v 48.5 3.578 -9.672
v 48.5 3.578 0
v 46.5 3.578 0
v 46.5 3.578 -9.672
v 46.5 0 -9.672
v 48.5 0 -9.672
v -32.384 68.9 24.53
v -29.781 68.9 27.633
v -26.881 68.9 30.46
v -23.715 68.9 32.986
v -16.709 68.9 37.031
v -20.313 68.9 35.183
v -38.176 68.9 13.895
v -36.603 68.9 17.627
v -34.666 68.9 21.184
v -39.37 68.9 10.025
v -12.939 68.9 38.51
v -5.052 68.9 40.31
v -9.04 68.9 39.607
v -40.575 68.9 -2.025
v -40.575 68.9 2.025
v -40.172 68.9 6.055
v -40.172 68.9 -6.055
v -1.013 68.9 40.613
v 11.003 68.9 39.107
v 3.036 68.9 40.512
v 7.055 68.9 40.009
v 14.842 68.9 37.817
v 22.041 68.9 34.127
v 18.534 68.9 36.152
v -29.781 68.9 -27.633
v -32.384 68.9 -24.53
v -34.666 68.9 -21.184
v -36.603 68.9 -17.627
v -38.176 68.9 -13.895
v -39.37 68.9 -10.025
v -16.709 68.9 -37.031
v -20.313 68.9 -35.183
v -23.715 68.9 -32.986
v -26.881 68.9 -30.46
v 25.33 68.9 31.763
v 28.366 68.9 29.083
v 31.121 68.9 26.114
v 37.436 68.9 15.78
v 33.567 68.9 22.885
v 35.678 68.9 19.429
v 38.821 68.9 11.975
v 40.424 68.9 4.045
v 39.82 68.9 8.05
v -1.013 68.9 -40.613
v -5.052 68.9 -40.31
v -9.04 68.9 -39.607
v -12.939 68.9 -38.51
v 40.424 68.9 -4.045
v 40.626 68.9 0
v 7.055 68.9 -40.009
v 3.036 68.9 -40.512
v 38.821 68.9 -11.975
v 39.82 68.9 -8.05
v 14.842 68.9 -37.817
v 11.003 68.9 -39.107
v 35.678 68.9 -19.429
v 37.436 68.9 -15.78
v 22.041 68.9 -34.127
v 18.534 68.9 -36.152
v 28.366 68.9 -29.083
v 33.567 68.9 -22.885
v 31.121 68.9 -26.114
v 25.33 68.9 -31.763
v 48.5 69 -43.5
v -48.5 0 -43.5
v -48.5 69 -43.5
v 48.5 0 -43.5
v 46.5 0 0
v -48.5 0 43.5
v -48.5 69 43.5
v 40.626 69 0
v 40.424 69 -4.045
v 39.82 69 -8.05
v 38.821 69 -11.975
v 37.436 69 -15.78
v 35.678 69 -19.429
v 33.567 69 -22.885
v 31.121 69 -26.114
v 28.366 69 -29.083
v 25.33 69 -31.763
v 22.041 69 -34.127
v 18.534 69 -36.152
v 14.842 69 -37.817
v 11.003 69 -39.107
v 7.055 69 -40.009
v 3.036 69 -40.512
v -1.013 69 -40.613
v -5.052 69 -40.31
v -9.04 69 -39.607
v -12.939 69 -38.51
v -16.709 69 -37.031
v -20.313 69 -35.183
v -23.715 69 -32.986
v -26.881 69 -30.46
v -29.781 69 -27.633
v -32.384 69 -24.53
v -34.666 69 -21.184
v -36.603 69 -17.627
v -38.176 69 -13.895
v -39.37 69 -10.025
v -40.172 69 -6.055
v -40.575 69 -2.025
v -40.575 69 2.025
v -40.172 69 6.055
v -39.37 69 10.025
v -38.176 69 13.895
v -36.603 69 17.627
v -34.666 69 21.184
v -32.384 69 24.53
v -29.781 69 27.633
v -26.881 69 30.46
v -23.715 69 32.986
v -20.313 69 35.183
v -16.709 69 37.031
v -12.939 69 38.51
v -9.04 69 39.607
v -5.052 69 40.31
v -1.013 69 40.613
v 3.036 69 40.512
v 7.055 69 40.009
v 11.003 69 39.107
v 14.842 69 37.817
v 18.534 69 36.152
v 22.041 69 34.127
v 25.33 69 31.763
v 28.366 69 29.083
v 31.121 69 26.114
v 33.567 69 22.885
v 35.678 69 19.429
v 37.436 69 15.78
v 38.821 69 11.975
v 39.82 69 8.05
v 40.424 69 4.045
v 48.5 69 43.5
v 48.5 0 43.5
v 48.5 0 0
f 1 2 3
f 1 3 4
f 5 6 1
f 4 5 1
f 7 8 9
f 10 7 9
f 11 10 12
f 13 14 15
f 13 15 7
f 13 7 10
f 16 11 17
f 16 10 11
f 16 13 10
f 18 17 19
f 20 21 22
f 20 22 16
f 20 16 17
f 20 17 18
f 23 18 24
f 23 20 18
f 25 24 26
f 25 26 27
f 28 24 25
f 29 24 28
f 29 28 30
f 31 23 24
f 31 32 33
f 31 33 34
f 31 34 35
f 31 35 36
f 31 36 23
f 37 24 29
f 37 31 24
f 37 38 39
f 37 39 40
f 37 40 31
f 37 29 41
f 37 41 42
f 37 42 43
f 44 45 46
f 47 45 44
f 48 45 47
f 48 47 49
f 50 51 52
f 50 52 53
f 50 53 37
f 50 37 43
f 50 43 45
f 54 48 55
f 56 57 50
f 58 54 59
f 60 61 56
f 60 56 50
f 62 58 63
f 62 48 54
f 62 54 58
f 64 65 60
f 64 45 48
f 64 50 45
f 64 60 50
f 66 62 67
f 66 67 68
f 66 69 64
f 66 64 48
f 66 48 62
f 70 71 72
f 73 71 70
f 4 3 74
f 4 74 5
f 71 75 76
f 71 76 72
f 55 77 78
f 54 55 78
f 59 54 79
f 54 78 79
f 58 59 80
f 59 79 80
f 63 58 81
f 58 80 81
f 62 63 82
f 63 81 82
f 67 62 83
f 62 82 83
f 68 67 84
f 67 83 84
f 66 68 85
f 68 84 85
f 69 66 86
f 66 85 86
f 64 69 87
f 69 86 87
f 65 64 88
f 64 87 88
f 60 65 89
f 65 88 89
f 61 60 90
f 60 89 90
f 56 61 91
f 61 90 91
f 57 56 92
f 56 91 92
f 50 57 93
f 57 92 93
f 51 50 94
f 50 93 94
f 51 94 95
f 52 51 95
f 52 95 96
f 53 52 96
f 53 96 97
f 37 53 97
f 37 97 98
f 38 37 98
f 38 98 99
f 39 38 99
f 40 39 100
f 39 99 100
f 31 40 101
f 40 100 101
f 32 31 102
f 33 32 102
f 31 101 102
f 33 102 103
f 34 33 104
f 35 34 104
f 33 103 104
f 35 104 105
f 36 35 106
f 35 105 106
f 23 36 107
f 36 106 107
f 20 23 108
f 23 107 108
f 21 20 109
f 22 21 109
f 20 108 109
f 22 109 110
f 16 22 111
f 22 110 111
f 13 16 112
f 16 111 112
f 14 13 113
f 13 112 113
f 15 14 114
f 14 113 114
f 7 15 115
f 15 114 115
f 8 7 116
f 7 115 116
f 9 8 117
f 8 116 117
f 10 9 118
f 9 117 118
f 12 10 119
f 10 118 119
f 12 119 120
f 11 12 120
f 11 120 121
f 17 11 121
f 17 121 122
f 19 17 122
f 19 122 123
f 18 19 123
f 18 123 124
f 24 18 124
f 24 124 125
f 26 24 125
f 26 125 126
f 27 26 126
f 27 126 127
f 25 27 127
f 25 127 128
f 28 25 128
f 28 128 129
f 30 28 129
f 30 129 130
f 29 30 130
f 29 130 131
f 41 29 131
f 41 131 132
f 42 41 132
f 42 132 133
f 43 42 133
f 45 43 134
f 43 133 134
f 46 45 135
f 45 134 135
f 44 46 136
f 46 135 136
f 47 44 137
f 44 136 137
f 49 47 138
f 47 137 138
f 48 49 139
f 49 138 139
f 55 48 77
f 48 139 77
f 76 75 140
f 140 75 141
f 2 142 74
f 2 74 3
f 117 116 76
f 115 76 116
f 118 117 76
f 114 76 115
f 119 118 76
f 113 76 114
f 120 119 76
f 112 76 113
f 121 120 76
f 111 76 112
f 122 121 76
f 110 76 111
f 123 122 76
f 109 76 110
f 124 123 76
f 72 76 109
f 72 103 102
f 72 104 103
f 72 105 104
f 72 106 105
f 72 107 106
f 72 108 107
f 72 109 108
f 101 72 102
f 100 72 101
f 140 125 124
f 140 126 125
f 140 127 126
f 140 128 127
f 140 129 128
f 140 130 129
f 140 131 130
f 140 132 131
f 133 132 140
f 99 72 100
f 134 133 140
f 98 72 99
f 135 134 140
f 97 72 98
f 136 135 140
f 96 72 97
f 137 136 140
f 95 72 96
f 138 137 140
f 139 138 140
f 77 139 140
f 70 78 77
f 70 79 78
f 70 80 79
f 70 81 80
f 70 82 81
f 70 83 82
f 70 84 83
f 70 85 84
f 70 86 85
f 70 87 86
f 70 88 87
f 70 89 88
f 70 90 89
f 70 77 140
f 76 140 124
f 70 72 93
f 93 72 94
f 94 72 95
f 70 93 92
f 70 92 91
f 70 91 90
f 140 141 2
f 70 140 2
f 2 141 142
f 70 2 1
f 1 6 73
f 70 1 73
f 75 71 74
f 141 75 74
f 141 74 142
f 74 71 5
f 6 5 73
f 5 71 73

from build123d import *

# Parameters (mm, degrees)
CROQUIS1_W              = 97
CROQUIS1_H              = 87
SALIENTE_EXTRUIR1_DEPTH = 69
CROQUIS2_R              = 40.625765917
CORTAR_EXTRUIR1_DEPTH   = 0.1
CROQUIS3_W              = 9.671731422
CROQUIS3_H              = 3.578358675
CORTAR_EXTRUIR2_DEPTH   = 2


with BuildPart() as part:
    # Croquis1 → Saliente-Extruir1 (new body)
    with BuildSketch(Plane(origin=(0, 0, 0), x_dir=(1, 0, 0), z_dir=(0, 1, 0))):
        Rectangle(CROQUIS1_W, CROQUIS1_H)
    extrude(amount=SALIENTE_EXTRUIR1_DEPTH)

    # Croquis2 → Cortar-Extruir1 (cut)
    with BuildSketch(Plane(origin=(0, 69, 0), x_dir=(1, 0, 0), z_dir=(0, 1, 0))):
        Circle(CROQUIS2_R)
    extrude(amount=-CORTAR_EXTRUIR1_DEPTH, mode=Mode.SUBTRACT)

    # Croquis3 → Cortar-Extruir2 (cut)
    with BuildSketch(Plane(origin=(48.5, 0, 0), x_dir=(0, 0, -1), z_dir=(1, 0, 0))):
        with Locations((4.835865711, 1.789179338)):
            Rectangle(CROQUIS3_W, CROQUIS3_H)
    extrude(amount=-CORTAR_EXTRUIR2_DEPTH, mode=Mode.SUBTRACT)


solid = part.part
